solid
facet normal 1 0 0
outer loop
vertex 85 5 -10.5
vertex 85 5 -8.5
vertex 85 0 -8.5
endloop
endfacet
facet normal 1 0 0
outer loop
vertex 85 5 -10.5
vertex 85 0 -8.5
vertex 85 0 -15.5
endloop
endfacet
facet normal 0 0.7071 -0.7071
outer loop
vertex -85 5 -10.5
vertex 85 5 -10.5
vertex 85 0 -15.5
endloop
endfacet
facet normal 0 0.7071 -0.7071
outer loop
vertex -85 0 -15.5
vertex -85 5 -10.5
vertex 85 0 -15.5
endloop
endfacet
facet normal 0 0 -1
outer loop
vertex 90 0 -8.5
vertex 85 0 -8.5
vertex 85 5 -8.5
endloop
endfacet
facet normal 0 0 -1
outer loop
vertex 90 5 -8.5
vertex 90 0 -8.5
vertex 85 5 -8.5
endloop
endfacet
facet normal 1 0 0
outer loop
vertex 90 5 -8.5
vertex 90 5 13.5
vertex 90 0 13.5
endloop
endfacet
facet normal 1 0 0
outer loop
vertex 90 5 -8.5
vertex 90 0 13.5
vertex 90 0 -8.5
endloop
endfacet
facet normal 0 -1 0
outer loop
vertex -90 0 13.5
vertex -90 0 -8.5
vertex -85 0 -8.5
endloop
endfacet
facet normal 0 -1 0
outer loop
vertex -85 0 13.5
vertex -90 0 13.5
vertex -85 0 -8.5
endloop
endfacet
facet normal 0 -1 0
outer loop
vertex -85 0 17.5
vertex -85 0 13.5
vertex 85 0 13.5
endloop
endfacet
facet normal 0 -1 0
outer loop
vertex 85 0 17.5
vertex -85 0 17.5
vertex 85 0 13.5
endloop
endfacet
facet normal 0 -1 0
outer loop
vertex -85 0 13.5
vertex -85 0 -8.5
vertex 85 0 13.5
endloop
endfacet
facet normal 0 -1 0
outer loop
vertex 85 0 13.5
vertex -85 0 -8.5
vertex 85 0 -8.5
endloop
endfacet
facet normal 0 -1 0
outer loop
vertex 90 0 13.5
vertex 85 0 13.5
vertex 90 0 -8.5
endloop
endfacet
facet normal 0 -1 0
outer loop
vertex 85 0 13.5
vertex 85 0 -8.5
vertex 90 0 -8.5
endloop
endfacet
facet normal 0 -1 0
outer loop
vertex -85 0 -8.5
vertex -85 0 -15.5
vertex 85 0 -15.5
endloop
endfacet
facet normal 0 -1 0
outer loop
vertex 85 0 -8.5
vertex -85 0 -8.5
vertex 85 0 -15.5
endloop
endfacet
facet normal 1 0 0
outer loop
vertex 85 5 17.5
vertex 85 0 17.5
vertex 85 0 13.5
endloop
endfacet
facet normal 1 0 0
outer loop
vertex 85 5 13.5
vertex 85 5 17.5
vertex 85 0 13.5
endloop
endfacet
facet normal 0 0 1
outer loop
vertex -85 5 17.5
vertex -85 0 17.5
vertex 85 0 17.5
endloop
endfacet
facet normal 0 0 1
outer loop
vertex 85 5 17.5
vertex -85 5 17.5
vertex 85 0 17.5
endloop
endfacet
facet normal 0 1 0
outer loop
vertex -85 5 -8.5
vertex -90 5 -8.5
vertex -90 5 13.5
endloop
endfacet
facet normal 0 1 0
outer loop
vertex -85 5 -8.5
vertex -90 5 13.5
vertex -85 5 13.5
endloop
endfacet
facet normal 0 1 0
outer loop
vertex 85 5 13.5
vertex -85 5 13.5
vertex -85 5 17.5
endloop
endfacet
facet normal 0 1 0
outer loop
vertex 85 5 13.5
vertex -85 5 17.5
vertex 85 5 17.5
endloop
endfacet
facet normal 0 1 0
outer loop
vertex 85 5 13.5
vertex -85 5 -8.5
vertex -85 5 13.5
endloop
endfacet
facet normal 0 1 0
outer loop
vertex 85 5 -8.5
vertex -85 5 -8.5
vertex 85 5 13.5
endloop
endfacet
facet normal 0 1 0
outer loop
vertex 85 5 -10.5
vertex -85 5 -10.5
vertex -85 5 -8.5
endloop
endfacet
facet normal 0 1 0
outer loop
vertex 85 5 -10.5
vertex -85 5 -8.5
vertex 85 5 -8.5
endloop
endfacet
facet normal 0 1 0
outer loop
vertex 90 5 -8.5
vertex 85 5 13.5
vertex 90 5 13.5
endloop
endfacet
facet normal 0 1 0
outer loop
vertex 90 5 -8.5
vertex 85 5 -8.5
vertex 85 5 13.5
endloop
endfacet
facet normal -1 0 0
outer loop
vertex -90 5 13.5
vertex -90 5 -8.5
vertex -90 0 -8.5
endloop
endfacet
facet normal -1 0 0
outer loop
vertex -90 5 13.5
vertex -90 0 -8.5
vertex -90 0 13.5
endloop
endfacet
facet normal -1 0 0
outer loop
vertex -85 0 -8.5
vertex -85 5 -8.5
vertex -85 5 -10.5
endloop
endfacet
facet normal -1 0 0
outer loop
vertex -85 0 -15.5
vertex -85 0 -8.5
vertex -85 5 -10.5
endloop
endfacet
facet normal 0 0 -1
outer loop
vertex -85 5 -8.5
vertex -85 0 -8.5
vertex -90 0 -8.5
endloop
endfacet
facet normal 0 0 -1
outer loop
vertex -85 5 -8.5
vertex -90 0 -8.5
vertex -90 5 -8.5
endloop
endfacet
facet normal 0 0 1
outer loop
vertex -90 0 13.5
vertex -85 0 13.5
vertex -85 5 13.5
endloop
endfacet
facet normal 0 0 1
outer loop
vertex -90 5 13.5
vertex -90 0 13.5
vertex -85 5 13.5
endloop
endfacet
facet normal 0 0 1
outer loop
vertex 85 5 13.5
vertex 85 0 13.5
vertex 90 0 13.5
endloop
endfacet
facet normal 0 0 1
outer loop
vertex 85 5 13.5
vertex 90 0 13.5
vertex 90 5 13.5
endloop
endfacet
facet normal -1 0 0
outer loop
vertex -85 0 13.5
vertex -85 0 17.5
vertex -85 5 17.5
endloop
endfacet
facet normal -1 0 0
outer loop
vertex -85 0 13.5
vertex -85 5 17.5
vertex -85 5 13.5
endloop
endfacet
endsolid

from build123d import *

# Parameters (mm, degrees)
SKETCH2_W           = 170
SKETCH2_H           = 35
BOSS_EXTRUDE1_DEPTH = 5
CUT_EXTRUDE1_DEPTH  = 200
SKETCH5_W           = 22
SKETCH5_H           = 5
BOSS_EXTRUDE2_DEPTH = 5
SKETCH6_W           = 22
SKETCH6_H           = 5
BOSS_EXTRUDE3_DEPTH = 5
CUT_EXTRUDE2_DEPTH  = 563


with BuildPart() as part:
    # Sketch2 → Boss-Extrude1 (new body)
    with BuildSketch(Plane(origin=(0, 0, 0), x_dir=(1, 0, 0), z_dir=(0, 1, 0))):
        Rectangle(SKETCH2_W, SKETCH2_H)
    extrude(amount=BOSS_EXTRUDE1_DEPTH)

    # Sketch4 → Cut-Extrude1 (cut)
    with BuildSketch(Plane.ZY.offset(85)):
        Polygon((-17.5, 0), (-12.5, 5), (-17.5, 5), align=None)
    extrude(amount=-CUT_EXTRUDE1_DEPTH, mode=Mode.SUBTRACT)

    # Sketch5 → Boss-Extrude2 (add)
    with BuildSketch(Plane.ZY.offset(85)):
        with Locations((2.5, 2.5)):
            Rectangle(SKETCH5_W, SKETCH5_H)
    extrude(amount=BOSS_EXTRUDE2_DEPTH)

    # Sketch6 → Boss-Extrude3 (add)
    with BuildSketch(Plane(origin=(85, 0, 0), x_dir=(0, 0, -1), z_dir=(1, 0, 0))):
        with Locations((-2.5, 2.5)):
            Rectangle(SKETCH6_W, SKETCH6_H)
    extrude(amount=BOSS_EXTRUDE3_DEPTH)

    # Sketch7 → Cut-Extrude2 (cut)
    with BuildSketch(Plane(origin=(85, 0, 0), x_dir=(0, 0, -1), z_dir=(1, 0, 0))):
        Polygon((12.5, 5), (10.5, 5), (15.5, 0), (17.5, 0), align=None)
    extrude(amount=-CUT_EXTRUDE2_DEPTH, mode=Mode.SUBTRACT)


solid = part.part
